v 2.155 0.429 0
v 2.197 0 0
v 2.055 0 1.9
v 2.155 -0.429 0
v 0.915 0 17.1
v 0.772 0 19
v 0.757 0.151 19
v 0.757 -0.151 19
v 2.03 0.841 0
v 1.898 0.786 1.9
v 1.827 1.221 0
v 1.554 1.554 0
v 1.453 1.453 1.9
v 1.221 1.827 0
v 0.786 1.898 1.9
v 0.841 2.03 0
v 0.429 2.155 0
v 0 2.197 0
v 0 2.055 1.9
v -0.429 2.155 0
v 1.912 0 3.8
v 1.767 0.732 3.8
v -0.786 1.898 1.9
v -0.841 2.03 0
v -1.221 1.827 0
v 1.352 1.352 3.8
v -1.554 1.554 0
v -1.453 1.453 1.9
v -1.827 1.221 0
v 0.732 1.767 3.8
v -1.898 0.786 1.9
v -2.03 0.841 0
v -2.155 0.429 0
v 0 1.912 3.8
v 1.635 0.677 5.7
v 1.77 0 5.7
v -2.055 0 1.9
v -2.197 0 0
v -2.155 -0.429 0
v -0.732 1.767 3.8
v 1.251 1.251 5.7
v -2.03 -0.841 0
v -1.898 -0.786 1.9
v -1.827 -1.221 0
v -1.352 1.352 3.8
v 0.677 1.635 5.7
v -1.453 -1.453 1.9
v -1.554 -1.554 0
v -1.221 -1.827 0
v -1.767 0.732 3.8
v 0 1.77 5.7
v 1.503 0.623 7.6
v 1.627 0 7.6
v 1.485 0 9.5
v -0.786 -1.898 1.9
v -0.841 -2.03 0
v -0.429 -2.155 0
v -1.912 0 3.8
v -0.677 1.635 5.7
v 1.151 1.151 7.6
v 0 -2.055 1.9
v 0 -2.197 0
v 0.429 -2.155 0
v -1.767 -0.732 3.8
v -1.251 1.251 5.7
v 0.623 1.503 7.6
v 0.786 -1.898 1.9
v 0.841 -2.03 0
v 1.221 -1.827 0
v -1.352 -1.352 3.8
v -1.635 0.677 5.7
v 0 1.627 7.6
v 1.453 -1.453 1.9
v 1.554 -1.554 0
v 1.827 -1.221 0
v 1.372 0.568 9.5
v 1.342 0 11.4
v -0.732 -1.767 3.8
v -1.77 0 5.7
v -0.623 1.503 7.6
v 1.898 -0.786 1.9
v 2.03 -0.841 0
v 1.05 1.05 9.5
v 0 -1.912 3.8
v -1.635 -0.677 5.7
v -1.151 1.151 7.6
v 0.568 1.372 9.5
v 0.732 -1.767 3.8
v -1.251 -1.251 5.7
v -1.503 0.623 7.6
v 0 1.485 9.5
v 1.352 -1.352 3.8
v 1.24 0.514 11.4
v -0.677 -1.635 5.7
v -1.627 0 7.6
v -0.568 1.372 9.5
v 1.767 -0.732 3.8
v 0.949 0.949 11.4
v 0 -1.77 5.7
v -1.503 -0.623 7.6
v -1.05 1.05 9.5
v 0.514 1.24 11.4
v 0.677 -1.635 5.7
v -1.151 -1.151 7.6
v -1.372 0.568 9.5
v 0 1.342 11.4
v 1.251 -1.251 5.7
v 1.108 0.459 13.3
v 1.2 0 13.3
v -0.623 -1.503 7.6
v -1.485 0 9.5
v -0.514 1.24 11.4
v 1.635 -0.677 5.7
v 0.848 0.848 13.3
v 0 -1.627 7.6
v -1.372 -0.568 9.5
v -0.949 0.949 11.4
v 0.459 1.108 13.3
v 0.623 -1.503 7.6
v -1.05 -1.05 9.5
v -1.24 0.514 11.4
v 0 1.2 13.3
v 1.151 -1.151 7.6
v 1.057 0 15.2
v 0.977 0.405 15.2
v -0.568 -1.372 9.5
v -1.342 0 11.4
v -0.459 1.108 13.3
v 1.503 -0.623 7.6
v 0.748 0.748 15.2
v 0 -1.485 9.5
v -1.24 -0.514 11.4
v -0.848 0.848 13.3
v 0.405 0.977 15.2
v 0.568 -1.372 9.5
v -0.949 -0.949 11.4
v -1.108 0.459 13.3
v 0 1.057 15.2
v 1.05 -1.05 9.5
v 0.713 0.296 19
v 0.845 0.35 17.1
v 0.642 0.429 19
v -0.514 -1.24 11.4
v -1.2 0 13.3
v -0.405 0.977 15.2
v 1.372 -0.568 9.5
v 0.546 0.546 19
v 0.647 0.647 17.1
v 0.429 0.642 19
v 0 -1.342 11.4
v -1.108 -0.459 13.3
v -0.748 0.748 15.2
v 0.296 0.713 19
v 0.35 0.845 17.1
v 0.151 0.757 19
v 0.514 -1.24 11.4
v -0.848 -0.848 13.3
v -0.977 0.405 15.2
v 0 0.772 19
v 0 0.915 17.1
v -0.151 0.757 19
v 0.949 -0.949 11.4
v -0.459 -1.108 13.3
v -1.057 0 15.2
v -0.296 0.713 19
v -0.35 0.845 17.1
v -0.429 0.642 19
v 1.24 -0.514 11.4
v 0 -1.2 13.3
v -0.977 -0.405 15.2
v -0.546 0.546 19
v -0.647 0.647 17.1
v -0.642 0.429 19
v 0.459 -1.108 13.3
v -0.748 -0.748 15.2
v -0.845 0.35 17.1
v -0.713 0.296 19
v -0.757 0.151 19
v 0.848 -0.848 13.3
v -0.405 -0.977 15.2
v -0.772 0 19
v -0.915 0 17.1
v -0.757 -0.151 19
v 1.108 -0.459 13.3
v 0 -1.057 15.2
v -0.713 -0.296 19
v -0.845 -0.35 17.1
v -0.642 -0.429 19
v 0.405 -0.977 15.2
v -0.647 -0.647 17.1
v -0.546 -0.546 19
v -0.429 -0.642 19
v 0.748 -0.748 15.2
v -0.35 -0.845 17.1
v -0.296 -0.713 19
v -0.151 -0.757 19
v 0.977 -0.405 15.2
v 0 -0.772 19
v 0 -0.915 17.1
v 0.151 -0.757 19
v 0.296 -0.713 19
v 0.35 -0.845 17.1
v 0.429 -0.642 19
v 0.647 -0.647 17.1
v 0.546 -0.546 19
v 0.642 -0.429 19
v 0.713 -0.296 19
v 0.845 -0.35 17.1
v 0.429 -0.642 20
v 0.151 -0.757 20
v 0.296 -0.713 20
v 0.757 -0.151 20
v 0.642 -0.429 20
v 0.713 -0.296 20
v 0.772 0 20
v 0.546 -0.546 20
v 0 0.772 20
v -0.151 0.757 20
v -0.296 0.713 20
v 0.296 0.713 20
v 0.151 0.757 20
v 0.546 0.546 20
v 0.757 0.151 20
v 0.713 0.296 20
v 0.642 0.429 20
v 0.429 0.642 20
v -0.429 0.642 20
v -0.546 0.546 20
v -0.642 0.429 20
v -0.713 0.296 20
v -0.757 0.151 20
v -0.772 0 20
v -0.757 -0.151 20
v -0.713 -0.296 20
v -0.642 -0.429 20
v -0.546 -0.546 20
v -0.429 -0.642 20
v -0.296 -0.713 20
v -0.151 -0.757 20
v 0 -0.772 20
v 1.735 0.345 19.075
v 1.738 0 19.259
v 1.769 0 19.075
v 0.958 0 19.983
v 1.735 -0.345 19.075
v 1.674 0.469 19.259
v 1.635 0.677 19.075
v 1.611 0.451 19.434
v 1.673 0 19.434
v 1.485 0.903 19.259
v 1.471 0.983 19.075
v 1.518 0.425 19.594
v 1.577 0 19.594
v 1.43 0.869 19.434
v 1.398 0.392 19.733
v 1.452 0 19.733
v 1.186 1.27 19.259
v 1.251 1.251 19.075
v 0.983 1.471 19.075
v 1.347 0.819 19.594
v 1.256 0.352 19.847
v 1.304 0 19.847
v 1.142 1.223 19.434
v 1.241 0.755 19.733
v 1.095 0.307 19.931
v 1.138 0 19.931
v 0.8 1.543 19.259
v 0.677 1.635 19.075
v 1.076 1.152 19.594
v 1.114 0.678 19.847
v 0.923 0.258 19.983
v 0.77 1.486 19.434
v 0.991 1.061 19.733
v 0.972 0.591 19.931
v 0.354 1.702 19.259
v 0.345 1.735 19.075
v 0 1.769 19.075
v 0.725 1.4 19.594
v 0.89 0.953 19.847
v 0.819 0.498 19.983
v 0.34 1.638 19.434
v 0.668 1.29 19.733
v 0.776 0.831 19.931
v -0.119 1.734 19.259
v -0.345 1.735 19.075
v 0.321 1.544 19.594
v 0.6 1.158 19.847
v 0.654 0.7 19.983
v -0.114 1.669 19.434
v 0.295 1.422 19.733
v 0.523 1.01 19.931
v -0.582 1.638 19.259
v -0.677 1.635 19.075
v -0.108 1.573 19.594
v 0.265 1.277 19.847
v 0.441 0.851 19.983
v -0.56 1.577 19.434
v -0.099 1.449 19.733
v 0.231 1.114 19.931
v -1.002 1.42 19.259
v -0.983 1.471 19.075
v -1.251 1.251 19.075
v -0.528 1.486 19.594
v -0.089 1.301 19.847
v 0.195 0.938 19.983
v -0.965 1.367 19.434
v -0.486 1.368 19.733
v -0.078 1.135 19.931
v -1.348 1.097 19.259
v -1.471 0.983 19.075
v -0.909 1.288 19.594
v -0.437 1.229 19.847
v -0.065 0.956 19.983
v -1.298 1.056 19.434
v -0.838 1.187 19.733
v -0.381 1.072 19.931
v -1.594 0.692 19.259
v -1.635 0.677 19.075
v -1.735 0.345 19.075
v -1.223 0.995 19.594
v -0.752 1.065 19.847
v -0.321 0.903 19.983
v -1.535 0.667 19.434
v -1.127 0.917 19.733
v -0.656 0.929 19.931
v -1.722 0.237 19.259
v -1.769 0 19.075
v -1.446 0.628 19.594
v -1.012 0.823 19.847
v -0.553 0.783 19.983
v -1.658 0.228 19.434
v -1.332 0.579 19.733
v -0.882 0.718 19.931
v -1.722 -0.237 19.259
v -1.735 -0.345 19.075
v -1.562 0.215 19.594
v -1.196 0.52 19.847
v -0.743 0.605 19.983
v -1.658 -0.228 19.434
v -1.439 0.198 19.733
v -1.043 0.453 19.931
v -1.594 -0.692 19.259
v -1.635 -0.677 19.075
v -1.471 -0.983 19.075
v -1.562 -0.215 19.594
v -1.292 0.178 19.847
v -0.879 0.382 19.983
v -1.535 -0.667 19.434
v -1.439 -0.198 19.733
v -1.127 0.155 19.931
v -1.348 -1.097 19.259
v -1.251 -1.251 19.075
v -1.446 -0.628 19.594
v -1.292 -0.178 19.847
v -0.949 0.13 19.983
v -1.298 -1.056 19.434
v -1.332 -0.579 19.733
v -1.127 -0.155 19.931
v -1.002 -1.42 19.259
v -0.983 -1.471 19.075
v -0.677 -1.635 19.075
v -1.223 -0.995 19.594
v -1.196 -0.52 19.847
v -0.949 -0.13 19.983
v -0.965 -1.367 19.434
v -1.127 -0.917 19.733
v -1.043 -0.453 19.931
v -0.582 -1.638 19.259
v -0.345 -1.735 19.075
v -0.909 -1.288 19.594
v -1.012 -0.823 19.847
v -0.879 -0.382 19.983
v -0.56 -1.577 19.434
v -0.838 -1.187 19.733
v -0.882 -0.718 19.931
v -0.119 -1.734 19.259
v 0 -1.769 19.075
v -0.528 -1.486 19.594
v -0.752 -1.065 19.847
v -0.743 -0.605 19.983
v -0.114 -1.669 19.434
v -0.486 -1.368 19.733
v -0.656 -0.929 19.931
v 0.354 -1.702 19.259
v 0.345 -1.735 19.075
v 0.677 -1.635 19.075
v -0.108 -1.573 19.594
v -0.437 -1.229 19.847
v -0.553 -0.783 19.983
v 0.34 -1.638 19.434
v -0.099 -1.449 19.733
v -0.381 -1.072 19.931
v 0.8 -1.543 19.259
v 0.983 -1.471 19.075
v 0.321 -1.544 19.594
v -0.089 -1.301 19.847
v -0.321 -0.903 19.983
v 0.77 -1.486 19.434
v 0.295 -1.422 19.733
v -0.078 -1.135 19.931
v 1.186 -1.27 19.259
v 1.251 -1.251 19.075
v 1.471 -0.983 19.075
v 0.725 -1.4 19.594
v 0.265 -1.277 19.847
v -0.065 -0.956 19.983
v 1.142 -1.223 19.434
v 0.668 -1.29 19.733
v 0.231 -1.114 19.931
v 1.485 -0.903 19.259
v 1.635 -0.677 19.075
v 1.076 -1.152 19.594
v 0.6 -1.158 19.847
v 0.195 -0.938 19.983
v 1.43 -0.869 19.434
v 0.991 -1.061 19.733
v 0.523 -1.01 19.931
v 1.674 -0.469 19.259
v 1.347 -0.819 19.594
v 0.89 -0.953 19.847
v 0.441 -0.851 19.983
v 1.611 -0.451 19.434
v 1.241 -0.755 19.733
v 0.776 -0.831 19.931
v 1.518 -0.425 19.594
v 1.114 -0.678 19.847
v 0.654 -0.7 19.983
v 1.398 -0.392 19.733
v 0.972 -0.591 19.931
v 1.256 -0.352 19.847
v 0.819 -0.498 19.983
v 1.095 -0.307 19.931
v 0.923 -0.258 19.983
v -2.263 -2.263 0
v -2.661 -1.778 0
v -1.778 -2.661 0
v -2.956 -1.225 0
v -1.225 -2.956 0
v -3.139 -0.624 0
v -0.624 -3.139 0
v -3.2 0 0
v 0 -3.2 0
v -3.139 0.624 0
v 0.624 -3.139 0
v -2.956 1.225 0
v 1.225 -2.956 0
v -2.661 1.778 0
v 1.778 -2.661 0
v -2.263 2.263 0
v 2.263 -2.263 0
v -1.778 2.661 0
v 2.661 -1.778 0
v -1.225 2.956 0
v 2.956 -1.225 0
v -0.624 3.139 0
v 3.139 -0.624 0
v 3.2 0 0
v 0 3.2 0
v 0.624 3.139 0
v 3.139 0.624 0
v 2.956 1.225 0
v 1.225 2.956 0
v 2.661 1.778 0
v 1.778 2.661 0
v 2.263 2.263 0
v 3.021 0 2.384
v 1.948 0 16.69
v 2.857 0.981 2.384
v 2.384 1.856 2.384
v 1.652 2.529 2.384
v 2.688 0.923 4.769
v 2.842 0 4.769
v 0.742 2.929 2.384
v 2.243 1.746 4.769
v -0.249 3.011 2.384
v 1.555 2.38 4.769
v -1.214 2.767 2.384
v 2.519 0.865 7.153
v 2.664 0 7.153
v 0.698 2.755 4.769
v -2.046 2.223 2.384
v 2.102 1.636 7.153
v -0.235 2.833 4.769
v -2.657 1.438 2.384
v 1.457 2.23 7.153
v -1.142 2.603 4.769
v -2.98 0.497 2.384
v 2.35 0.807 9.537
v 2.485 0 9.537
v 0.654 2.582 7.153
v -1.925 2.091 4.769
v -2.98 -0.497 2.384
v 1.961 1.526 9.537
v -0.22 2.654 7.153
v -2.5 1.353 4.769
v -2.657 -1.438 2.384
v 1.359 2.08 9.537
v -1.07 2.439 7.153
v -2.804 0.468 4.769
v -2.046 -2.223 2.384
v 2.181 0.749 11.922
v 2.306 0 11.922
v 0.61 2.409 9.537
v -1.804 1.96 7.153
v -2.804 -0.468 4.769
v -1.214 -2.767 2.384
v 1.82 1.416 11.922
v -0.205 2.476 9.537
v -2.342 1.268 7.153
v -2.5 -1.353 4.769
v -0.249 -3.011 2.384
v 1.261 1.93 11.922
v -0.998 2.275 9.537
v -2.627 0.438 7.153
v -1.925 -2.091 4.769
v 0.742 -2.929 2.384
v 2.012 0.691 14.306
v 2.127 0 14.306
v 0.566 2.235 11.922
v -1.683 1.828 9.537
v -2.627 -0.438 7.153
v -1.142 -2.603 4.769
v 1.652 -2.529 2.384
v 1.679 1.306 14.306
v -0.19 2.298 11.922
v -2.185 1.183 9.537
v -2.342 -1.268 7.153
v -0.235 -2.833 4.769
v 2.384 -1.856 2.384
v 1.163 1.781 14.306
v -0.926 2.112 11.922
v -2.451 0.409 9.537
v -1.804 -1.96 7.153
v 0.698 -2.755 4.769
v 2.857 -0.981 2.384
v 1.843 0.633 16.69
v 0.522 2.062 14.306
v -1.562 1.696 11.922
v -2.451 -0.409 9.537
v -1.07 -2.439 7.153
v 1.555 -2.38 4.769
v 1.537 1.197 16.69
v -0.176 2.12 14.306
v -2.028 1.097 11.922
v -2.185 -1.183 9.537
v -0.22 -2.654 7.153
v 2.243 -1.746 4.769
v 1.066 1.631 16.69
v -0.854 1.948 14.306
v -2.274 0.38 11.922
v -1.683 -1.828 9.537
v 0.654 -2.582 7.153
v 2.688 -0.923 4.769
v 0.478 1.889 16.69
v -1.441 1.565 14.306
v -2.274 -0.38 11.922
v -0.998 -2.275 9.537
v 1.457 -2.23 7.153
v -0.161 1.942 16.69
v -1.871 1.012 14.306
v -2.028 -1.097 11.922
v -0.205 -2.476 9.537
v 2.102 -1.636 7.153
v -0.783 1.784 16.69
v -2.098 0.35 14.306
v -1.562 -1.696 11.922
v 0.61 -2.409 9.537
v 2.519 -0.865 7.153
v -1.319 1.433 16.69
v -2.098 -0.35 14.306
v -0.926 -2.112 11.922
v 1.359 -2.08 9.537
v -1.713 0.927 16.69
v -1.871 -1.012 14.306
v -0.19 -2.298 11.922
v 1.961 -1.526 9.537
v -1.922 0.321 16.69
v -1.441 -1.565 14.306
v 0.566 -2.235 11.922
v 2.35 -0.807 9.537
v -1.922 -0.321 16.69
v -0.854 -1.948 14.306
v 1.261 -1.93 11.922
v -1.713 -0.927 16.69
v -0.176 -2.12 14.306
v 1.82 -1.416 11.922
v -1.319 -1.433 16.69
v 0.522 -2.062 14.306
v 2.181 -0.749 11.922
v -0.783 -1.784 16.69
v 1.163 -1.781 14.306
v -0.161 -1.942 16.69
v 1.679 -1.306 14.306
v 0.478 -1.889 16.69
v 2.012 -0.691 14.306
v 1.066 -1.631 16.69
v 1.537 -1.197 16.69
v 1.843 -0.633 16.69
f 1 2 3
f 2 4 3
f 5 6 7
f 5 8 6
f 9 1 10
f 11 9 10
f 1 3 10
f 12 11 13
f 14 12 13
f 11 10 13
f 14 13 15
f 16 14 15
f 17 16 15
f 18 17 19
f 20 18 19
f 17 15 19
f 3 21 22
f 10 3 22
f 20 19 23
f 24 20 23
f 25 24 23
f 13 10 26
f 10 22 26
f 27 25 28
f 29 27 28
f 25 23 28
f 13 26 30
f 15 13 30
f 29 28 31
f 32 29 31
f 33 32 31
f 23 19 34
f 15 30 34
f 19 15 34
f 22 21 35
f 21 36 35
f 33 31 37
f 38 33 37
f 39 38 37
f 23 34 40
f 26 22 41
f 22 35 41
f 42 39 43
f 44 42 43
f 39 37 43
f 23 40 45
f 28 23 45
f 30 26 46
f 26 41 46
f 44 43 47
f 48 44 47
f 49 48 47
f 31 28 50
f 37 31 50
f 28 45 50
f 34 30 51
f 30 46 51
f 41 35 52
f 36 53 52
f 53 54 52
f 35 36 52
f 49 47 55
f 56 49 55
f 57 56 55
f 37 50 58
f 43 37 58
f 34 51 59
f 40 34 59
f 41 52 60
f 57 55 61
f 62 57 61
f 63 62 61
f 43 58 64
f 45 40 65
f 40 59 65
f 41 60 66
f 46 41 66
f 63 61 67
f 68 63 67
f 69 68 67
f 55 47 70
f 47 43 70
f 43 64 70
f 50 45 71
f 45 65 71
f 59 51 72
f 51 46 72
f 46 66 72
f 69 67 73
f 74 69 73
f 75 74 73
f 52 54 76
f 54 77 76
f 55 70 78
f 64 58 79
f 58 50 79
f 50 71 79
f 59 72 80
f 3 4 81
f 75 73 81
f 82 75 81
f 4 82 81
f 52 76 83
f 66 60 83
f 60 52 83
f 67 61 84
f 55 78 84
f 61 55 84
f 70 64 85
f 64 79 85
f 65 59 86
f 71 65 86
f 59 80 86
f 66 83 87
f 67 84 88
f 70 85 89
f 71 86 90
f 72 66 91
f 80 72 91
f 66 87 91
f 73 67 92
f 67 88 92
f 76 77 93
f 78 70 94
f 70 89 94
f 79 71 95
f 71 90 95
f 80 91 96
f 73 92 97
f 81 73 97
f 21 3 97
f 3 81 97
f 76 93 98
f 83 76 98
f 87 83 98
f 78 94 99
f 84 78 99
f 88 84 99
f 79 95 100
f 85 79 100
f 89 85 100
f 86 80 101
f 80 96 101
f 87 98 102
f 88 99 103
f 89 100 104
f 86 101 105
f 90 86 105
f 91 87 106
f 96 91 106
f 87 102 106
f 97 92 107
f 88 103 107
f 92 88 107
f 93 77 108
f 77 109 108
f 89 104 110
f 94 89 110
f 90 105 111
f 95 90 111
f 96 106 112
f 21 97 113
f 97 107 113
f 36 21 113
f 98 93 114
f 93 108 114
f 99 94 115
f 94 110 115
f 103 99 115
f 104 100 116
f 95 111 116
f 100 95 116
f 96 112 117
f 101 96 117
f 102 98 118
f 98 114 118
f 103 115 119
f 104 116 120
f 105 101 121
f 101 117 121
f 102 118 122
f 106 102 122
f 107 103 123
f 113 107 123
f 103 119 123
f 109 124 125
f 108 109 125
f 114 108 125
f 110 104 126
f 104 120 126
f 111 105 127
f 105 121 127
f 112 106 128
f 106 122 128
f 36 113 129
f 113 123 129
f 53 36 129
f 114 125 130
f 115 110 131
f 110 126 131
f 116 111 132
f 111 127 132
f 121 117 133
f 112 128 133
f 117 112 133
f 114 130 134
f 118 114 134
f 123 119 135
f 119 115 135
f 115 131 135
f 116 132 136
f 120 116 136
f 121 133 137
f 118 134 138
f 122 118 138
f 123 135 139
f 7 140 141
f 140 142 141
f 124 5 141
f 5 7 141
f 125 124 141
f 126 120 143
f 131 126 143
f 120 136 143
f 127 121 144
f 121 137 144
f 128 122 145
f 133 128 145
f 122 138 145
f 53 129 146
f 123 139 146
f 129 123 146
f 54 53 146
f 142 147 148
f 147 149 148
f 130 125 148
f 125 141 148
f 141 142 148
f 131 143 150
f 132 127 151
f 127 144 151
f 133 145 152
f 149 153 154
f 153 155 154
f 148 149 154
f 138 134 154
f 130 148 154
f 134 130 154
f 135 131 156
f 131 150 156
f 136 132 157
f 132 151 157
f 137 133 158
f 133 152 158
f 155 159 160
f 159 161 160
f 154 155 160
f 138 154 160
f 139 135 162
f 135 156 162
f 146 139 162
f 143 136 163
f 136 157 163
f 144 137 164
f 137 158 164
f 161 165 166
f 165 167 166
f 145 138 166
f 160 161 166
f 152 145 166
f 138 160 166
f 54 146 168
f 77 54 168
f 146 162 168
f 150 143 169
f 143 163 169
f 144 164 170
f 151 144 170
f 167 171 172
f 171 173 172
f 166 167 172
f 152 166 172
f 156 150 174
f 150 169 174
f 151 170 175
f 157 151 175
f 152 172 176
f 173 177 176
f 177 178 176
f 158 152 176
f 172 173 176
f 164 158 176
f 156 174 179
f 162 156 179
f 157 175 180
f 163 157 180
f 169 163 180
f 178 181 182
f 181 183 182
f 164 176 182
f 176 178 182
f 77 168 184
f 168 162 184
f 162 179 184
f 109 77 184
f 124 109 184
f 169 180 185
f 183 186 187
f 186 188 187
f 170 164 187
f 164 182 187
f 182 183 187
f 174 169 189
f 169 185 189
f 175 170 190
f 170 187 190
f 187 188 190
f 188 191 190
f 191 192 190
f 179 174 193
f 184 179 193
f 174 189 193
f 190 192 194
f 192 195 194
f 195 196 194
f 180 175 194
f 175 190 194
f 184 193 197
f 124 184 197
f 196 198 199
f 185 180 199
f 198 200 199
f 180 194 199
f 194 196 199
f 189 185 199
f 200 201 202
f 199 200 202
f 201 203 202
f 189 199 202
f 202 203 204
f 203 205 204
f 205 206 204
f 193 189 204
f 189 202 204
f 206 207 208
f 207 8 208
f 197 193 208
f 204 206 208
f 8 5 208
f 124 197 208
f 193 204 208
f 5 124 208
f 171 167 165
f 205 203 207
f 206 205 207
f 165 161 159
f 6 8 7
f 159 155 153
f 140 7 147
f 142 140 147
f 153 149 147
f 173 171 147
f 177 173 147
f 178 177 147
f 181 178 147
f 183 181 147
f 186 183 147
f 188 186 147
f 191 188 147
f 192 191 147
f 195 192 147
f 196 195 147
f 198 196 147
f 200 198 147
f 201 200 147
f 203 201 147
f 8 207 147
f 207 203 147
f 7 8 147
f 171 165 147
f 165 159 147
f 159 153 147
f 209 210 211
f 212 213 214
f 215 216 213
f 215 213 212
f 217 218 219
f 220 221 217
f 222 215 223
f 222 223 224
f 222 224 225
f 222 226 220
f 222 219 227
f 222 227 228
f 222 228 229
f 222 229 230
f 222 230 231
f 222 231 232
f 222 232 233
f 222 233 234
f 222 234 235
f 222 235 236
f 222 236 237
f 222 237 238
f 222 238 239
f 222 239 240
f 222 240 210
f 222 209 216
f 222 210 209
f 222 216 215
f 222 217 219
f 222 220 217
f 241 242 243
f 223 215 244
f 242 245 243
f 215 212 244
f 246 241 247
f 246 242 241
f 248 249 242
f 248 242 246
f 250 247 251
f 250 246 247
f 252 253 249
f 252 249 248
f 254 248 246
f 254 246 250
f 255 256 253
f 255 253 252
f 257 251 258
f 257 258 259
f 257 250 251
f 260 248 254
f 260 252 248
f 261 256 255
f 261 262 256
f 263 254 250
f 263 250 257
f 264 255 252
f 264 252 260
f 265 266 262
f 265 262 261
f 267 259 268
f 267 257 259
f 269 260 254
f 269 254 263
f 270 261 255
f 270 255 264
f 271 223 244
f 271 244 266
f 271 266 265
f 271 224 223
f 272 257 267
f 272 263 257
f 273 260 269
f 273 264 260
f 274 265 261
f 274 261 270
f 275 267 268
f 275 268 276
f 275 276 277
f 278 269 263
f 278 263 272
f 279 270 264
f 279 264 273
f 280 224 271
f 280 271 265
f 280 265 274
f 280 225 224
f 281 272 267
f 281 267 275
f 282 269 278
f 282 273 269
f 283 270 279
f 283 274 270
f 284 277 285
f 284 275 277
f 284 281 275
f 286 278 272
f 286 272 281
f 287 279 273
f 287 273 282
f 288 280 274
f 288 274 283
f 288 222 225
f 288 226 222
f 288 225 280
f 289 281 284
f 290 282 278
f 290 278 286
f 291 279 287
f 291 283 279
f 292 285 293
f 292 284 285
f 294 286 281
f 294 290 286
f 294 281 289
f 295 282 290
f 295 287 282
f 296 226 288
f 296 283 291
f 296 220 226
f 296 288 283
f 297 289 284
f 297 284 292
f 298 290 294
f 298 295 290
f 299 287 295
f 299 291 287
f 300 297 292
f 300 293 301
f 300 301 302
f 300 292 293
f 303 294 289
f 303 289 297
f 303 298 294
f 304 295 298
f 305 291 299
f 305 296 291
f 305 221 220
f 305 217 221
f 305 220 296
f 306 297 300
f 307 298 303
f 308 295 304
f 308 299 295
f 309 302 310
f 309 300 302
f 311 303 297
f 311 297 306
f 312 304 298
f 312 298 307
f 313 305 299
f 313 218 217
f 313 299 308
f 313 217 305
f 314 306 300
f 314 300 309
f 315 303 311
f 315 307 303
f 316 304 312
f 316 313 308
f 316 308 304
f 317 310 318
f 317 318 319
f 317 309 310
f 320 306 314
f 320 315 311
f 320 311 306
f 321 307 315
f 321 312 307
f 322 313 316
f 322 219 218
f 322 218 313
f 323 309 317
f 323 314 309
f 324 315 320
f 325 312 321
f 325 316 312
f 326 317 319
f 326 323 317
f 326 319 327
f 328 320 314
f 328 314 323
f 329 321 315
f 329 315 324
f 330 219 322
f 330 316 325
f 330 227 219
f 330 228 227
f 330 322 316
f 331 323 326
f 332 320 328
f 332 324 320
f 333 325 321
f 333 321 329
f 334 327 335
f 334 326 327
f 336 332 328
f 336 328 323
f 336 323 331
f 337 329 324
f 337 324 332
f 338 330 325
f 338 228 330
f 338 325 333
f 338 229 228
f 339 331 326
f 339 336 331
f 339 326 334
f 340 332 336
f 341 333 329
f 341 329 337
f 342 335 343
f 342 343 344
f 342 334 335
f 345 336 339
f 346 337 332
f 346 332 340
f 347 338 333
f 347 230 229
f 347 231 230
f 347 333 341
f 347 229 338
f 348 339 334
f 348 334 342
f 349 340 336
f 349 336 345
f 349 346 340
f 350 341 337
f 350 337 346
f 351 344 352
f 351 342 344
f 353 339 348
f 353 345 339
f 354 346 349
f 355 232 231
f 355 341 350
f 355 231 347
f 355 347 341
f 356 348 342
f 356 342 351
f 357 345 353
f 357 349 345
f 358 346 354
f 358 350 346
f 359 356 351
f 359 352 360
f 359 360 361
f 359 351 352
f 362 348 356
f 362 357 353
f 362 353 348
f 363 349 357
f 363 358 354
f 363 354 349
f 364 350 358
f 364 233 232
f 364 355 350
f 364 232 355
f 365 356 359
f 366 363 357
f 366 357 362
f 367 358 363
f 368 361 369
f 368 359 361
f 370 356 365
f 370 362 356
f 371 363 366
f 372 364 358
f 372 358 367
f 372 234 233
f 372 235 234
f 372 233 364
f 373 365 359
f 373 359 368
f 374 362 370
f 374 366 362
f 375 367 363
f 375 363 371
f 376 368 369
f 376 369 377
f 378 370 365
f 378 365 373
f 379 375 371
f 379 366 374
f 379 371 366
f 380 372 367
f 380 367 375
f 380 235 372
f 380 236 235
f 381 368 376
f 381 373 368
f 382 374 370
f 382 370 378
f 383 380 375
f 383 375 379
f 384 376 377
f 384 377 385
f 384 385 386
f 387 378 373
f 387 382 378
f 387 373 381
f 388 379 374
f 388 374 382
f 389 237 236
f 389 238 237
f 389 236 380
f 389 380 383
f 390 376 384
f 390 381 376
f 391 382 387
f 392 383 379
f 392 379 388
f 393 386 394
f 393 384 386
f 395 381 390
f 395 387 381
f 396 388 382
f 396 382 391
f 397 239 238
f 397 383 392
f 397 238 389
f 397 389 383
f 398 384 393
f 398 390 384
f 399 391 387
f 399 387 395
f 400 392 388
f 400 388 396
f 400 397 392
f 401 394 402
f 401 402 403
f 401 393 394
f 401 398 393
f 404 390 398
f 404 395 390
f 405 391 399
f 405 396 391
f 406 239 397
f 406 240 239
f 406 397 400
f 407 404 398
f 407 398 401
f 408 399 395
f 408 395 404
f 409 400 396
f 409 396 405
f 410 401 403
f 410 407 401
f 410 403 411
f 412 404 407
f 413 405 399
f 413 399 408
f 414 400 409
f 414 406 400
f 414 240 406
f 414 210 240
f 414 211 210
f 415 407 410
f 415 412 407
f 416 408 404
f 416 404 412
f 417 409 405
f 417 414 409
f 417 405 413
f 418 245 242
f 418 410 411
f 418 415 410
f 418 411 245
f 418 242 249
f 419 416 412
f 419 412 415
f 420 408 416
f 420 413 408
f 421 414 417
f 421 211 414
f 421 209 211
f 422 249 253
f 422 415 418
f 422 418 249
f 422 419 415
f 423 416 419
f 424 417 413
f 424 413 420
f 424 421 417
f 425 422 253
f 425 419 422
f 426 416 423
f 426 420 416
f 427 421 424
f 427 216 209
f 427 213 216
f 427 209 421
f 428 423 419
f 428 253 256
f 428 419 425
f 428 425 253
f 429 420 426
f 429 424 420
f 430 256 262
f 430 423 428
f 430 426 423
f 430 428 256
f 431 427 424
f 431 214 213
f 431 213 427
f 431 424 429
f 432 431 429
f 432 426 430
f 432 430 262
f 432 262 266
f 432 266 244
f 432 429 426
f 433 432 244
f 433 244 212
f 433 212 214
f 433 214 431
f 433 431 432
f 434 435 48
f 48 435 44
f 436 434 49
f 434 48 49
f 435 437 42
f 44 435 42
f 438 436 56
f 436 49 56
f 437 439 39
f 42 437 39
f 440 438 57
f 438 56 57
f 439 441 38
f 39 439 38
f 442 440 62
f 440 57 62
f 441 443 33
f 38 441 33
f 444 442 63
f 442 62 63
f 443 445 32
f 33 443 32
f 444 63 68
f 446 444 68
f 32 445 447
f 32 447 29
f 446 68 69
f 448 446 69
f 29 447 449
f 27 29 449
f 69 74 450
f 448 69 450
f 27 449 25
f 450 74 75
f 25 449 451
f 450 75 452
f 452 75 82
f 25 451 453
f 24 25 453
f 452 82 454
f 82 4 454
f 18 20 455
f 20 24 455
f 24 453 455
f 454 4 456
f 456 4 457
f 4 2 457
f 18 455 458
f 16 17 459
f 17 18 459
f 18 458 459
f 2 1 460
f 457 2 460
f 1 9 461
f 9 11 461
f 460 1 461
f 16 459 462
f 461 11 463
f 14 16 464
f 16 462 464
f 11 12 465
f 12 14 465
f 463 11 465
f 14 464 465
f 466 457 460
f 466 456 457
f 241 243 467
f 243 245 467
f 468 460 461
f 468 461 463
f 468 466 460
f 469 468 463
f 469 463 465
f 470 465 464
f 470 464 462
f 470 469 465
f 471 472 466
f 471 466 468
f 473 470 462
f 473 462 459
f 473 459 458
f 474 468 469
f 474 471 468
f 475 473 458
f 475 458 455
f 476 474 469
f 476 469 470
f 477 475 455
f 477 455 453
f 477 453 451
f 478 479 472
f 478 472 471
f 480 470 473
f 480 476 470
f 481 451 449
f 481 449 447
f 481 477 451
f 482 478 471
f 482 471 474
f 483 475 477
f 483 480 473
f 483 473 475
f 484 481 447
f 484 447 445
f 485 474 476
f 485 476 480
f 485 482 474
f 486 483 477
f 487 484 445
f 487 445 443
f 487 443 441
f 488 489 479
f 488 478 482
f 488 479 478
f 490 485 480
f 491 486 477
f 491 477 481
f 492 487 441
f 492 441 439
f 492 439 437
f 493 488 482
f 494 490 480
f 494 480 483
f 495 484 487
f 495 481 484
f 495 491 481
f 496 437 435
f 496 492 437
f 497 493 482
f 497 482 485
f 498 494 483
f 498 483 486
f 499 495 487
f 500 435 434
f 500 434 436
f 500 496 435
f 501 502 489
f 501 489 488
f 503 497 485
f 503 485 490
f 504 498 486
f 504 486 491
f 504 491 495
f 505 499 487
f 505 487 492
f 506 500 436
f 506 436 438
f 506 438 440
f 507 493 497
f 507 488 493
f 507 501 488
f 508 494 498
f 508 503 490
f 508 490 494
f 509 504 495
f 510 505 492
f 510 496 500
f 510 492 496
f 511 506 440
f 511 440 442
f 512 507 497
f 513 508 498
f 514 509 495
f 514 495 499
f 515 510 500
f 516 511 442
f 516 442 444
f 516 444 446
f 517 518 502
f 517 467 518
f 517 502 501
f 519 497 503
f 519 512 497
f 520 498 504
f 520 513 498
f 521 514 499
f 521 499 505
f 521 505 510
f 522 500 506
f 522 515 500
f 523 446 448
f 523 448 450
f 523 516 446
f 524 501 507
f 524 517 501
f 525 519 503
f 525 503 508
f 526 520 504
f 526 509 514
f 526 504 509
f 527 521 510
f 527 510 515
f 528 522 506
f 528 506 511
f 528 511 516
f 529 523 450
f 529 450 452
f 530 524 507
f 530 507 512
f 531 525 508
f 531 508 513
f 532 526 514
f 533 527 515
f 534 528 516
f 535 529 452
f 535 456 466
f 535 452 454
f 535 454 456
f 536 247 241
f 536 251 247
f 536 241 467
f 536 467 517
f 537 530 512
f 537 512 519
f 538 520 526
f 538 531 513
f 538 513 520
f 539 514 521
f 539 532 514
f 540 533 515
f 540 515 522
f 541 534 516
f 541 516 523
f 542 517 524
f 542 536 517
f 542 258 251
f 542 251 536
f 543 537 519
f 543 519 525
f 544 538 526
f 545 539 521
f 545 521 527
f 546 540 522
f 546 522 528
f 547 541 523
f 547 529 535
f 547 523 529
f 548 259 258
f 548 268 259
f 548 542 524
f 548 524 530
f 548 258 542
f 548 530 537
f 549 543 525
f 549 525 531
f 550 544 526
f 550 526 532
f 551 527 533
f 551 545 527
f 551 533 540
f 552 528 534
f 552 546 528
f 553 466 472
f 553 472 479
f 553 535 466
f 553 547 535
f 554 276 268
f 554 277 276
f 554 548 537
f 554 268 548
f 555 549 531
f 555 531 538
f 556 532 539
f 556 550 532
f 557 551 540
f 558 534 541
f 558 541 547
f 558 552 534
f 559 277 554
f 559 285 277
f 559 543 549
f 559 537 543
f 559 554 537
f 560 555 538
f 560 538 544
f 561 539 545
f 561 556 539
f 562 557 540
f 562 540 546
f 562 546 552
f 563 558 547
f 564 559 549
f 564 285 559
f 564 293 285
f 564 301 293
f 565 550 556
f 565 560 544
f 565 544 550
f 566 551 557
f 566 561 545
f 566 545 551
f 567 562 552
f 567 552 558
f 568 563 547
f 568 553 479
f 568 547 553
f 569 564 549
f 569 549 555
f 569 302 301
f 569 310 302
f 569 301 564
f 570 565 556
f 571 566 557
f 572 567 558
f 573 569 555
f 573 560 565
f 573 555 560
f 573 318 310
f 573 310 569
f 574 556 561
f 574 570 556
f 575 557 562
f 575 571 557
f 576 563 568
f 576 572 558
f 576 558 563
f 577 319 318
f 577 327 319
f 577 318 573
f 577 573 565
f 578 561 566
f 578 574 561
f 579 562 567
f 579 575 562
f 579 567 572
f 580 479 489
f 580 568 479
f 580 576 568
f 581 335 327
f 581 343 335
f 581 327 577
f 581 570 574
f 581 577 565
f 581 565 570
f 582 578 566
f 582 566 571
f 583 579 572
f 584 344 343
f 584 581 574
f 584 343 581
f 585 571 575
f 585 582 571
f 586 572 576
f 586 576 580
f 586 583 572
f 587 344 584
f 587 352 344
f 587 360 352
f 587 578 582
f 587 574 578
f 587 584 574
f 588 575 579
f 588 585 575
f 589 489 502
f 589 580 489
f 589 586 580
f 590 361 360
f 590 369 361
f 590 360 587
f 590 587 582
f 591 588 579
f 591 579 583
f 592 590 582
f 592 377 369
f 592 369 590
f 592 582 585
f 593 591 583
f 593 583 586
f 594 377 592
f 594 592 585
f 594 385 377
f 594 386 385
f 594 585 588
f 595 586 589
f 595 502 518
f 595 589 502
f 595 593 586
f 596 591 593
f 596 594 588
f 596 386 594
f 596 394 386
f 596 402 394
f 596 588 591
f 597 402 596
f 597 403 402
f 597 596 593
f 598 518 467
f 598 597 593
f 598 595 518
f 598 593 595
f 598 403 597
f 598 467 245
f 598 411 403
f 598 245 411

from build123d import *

# Parameters (mm, degrees)
F0_R = 3.2
F2_R = 1.7
F4_T = -1
F5_R = 1


with BuildPart() as f3:
    # F0 (on Top) → F3 section 0
    with BuildSketch(Plane.XY):
        Circle(F0_R)
    # F2 (on offset) → F3 section 1
    with BuildSketch(Plane.XY.offset(20)):
        Circle(F2_R)
    loft()

    # F4
    f4_openings = [f3.faces().sort_by_distance(p)[0] for p in [
        (0, 0, 0),
    ]]
    offset(amount=F4_T, openings=f4_openings, kind=Kind.INTERSECTION)

    # F5
    f5_edges = [f3.edges().sort_by_distance(p)[0] for p in [
        (-1.7, 0, 20),
    ]]
    fillet(f5_edges, radius=F5_R)


solid = f3.part
